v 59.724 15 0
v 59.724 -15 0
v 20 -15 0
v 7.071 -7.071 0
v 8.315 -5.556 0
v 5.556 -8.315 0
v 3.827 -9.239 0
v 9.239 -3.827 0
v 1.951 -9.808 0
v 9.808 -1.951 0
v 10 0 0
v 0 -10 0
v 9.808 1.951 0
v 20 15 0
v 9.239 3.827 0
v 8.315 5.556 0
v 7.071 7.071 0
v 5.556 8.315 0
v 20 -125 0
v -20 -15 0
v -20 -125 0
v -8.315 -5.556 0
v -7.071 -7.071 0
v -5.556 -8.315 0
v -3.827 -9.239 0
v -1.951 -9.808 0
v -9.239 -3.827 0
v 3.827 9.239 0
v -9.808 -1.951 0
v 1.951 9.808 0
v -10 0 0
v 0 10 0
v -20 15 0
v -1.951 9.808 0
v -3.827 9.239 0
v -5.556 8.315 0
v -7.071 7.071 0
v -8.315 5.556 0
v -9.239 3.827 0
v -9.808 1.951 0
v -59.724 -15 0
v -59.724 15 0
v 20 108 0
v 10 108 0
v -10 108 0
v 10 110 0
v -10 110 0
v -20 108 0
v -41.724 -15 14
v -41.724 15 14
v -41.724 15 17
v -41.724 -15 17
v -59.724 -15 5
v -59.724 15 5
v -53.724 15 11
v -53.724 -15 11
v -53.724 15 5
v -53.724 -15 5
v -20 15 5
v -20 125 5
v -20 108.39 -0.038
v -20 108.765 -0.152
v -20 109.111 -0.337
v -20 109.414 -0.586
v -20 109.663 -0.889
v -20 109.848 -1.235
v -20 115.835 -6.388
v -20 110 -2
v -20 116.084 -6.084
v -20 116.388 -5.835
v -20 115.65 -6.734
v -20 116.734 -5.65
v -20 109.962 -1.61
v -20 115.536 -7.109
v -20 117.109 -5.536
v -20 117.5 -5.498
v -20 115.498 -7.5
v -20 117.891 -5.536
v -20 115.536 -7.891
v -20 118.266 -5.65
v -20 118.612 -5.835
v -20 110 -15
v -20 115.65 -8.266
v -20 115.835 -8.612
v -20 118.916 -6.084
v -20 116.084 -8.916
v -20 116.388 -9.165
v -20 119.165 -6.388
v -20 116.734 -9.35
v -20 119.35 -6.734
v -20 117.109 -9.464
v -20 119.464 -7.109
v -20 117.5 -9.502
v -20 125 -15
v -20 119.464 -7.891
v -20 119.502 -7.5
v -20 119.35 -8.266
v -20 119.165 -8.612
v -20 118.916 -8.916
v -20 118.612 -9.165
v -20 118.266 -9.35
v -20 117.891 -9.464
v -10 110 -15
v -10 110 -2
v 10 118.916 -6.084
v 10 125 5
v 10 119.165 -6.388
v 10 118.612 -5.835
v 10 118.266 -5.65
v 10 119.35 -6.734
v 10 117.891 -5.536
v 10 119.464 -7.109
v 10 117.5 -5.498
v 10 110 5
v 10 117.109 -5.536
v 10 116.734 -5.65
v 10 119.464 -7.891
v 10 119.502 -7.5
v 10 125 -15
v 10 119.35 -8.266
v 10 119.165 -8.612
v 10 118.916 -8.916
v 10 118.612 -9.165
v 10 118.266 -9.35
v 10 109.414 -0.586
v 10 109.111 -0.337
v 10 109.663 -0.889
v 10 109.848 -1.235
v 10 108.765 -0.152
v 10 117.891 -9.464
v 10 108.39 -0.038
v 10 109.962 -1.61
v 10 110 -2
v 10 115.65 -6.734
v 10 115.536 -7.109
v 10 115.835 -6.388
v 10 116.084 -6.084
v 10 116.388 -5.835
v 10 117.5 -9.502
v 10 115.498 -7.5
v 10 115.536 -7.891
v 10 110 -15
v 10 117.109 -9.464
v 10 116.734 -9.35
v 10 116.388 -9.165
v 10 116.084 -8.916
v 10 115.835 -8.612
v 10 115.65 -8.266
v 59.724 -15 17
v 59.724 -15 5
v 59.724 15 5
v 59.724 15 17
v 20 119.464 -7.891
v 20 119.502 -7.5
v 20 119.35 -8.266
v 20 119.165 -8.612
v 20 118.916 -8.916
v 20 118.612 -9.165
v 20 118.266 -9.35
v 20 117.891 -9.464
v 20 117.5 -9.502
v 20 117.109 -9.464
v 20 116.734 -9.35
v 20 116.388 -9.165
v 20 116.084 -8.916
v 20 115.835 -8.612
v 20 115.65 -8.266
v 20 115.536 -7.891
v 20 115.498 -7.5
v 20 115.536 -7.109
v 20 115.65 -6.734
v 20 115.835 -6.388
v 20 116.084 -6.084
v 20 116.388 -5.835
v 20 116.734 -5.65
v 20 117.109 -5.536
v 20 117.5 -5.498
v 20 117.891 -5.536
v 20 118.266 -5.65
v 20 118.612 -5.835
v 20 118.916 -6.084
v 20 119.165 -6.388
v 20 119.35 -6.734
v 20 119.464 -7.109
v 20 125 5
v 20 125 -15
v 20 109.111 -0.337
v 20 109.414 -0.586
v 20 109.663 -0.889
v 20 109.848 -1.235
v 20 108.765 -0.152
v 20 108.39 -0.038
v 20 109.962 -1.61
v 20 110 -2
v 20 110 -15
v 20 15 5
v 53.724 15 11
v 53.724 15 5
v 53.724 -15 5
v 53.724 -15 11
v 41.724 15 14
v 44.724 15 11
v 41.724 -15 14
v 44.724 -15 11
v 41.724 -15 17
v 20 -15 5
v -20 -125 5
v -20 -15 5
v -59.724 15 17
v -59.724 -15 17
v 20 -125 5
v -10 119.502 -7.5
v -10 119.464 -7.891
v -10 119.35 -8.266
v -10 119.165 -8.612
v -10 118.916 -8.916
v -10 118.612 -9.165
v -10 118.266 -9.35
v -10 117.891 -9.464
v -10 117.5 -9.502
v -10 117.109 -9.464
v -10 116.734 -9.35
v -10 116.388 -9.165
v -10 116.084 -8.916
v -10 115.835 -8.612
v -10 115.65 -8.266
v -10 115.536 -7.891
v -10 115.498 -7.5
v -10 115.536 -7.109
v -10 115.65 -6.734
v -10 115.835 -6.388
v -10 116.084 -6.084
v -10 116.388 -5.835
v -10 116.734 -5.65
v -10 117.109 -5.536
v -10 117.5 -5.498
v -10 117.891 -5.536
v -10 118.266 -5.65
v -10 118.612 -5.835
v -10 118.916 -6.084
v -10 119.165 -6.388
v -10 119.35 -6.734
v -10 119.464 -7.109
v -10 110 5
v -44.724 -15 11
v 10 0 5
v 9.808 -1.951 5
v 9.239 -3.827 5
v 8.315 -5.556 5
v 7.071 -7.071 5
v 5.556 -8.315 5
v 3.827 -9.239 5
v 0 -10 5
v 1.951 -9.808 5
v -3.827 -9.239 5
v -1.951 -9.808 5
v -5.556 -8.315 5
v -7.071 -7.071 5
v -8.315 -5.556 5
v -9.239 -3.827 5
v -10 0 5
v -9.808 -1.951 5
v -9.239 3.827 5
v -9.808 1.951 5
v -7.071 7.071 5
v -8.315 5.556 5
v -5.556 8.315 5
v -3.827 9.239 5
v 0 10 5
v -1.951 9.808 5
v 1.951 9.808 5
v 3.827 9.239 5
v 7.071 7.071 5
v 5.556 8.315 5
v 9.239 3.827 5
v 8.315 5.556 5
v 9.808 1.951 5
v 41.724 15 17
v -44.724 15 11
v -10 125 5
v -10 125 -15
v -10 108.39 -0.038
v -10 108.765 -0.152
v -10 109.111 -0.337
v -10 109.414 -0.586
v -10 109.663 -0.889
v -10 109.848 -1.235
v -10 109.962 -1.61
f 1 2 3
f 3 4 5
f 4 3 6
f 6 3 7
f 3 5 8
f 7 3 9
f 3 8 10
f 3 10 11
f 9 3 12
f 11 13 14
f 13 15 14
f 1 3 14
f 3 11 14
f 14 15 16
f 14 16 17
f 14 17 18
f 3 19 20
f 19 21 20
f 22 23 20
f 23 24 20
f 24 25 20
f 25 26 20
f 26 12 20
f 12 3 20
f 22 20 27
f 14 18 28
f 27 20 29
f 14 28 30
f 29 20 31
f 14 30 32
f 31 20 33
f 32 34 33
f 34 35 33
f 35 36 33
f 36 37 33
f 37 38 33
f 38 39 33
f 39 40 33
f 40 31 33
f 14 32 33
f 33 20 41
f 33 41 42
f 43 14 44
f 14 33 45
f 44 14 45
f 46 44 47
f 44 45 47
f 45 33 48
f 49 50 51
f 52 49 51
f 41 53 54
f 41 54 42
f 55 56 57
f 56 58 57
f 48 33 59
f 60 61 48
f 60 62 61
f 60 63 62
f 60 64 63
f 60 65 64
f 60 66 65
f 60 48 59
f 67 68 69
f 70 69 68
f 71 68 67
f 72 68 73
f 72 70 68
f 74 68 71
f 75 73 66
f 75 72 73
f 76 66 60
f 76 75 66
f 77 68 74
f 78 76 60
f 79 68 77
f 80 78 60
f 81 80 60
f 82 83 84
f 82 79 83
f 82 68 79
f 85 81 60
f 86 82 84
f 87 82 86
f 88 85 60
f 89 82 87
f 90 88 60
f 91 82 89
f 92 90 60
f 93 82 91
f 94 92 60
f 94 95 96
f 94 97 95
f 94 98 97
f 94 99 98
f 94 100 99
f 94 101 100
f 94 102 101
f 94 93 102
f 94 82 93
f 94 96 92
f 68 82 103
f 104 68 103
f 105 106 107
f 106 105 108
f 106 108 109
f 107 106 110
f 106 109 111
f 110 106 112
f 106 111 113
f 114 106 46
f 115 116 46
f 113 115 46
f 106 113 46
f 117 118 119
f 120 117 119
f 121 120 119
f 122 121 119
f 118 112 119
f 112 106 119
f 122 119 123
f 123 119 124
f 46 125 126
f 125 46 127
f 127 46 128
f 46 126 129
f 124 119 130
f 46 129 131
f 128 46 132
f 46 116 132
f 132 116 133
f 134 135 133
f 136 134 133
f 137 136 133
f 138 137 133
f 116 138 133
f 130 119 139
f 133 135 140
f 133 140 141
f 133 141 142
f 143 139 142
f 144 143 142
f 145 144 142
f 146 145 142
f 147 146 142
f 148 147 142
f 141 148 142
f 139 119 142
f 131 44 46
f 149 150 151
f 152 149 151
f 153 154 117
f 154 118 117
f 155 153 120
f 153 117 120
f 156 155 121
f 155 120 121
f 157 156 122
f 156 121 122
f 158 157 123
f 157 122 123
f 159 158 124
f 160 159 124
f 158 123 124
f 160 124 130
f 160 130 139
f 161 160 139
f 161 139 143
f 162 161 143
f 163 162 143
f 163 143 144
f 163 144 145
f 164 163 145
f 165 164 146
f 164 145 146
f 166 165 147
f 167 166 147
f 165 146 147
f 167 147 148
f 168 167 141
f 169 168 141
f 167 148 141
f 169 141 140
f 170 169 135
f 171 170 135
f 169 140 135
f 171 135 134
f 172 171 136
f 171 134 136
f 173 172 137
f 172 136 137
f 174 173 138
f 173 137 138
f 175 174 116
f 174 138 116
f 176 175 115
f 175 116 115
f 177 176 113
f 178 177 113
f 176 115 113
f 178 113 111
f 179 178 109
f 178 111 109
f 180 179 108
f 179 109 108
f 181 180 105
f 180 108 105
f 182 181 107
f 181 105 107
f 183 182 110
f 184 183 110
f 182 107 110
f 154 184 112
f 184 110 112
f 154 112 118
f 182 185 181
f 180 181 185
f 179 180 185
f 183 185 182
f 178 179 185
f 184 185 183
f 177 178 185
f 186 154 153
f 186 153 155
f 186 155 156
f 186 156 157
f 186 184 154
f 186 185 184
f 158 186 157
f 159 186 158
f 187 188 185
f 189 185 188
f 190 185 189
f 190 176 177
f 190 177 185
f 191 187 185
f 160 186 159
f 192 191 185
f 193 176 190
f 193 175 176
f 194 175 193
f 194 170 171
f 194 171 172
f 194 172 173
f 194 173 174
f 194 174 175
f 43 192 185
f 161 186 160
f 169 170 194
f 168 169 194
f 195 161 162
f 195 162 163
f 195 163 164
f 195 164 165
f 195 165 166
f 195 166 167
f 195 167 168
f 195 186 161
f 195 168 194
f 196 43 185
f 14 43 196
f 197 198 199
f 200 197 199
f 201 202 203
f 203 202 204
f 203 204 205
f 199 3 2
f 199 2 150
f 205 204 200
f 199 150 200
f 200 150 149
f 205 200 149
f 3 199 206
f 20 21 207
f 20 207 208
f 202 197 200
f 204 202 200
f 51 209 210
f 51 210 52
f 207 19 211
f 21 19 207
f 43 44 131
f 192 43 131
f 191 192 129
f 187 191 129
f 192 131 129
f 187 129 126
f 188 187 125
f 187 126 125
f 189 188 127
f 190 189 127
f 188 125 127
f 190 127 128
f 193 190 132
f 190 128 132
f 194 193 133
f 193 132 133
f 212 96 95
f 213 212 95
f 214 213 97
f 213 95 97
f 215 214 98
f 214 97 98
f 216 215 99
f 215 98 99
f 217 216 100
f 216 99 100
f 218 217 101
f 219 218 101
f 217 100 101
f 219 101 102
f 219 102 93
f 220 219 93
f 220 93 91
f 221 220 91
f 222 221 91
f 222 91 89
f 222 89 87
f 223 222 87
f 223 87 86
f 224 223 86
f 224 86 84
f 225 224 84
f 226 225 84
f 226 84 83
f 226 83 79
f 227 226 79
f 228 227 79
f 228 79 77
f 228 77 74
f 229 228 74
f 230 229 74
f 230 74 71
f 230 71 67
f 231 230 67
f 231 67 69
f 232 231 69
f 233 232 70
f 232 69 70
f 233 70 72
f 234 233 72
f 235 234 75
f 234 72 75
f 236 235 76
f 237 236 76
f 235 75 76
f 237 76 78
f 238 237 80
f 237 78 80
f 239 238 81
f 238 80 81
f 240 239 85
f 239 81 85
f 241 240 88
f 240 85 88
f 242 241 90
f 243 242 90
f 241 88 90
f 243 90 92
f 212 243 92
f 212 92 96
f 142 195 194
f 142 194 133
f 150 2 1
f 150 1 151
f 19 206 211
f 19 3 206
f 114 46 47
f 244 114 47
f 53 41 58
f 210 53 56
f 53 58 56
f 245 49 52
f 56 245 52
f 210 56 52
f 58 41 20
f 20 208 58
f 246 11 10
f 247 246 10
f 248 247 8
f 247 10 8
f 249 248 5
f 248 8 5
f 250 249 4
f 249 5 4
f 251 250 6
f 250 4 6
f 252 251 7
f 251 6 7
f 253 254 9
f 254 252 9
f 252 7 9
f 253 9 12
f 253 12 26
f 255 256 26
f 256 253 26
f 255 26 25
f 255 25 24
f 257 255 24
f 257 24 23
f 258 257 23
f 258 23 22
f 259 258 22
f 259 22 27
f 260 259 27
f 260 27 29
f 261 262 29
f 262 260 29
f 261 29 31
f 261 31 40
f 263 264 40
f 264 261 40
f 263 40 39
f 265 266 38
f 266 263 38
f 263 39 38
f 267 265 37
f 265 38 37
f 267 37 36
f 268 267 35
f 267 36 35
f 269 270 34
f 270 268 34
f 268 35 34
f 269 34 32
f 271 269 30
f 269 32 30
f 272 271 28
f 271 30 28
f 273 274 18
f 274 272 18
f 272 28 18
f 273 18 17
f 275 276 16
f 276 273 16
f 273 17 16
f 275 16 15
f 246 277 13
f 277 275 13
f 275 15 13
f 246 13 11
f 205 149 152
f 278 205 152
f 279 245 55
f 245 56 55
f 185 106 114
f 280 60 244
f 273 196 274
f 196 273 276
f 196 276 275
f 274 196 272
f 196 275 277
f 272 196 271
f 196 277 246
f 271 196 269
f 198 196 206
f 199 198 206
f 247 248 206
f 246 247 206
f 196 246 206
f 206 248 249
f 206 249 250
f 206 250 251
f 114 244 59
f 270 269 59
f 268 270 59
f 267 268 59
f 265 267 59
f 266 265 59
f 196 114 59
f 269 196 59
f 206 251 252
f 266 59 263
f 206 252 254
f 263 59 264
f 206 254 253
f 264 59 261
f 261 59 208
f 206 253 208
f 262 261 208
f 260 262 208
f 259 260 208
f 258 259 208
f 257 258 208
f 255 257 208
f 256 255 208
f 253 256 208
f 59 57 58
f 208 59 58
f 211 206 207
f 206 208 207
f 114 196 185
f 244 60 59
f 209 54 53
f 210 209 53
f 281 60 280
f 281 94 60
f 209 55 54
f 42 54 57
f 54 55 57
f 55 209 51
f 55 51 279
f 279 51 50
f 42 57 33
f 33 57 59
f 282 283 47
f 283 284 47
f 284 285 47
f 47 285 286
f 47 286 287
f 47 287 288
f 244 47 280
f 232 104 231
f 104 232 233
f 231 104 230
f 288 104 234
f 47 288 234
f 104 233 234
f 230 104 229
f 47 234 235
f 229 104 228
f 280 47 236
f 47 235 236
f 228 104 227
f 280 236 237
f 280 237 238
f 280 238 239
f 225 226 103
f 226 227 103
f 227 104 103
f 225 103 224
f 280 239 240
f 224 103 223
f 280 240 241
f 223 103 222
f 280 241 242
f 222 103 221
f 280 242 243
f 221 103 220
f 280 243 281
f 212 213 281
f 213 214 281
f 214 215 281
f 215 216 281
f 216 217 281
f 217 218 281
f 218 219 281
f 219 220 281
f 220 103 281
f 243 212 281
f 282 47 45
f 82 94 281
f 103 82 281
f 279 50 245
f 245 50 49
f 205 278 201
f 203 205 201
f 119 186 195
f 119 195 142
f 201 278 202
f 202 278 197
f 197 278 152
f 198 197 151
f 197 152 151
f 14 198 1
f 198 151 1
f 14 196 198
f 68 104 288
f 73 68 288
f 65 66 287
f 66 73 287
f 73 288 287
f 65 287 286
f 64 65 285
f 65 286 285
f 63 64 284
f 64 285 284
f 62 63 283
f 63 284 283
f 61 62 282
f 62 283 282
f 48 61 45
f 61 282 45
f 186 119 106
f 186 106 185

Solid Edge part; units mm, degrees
sketch "Sketch1" plane through (0, 0, 0) normal (0, 0, 1) x (1, 0, 0)
  line L0 (20, -125) -> (-20, -125)
  line L1 (-20, -125) -> (-20, 125)
  line L2 (-20, 125) -> (20, 125)
  line L3 (20, 125) -> (20, -125)
  circle A0 centre (0, 0) radius 10
  dimension "D1" = 250
  dimension "D2" = 40
  dimension "D3" = 20
extrude "Ajout_matière_1" add sketch "Sketch1" along normal blind 5
sketch "Sketch2" plane through (0, 0, 0) normal (0, 0, -1) x (0, 1, 0)
  line L0 (125, 10) -> (110, 10)
  line L1 (110, 10) -> (110, -10)
  line L2 (110, -10) -> (125, -10)
  line L3 (125, -10) -> (125, 10)
  dimension "D1" = 20
  dimension "D2" = 15
extrude "Enlèvement_matière_1" cut sketch "Sketch2" against normal blind 34.8434
sketch "Sketch3" plane through (0, 0, 0) normal (0, 0, -1) x (0, 1, 0)
  line L0 (125, -20) -> (110, -20)
  line L1 (110, -20) -> (110, -10)
  line L2 (110, -10) -> (125, -10)
  line L3 (125, -10) -> (125, -20)
  line L4 (125, 20) -> (110, 20)
  line L5 (110, 20) -> (110, 10)
  line L6 (110, 10) -> (125, 10)
  line L7 (125, 10) -> (125, 20)
extrude "Ajout_matière_2" add sketch "Sketch3" along normal blind 15
sketch "Sketch4" plane through (-20, 0, -5) normal (-1, 0, 0) x (0, 1, 0)
  circle A0 centre (117.5, 2.5) radius 2.0023
  dimension "D1" = 7.5
  dimension "D2" = 4.0046
extrude "Enlèvement_matière_2" cut sketch "Sketch4" against normal blind 63.2944
fillet "Congé_1" radius 2 2 edges at (15, 110, 0) (-15, 110, 0)
sketch "Sketch5" plane through (-20, 0, -5) normal (-1, 0, 0) x (0, 1, 0)
  line L0 (-15, -10) -> (15, -10)
  line L1 (15, -10) -> (15, -5)
  line L2 (15, -5) -> (-15, -5)
  line L3 (-15, -5) -> (-15, -10)
  dimension "D1" = 30
extrude "Protrusion1" add sketch "Sketch5" along normal blind 39.7243
sketch "Sketch6" plane through (-19.8622, 0, 5) normal (0, 0, 1) x (0, -1, 0)
  line L0 (-15, -39.8622) -> (15, -39.8622)
  line L1 (15, -39.8622) -> (15, -33.8622)
  line L2 (15, -33.8622) -> (-15, -33.8622)
  line L3 (-15, -33.8622) -> (-15, -39.8622)
  dimension "D1" = 6
extrude "Ajout_matière_4" add sketch "Sketch6" along normal blind 12
sketch "Sketch7" plane through (-53.7243, 0, 11) normal (1, 0, 0) x (0, -1, 0)
  line L0 (-15, -6) -> (15, -6)
  line L1 (15, -6) -> (15, 0)
  line L2 (15, 0) -> (-15, 0)
  line L3 (-15, 0) -> (-15, -6)
extrude "Ajout_matière_7" add sketch "Sketch7" along normal blind 12
mirror "Mirror1" about plane through (0, 0, 0) normal (1, 0, 0) of "Ajout_matière_7", "Ajout_matière_4", "Protrusion1"
chamfer "Chanfrein_1" distance 3 angle 45 2 edges at (-41.7243, 0, 11) (41.7243, 0, 11)
properties material "Acier S235"
